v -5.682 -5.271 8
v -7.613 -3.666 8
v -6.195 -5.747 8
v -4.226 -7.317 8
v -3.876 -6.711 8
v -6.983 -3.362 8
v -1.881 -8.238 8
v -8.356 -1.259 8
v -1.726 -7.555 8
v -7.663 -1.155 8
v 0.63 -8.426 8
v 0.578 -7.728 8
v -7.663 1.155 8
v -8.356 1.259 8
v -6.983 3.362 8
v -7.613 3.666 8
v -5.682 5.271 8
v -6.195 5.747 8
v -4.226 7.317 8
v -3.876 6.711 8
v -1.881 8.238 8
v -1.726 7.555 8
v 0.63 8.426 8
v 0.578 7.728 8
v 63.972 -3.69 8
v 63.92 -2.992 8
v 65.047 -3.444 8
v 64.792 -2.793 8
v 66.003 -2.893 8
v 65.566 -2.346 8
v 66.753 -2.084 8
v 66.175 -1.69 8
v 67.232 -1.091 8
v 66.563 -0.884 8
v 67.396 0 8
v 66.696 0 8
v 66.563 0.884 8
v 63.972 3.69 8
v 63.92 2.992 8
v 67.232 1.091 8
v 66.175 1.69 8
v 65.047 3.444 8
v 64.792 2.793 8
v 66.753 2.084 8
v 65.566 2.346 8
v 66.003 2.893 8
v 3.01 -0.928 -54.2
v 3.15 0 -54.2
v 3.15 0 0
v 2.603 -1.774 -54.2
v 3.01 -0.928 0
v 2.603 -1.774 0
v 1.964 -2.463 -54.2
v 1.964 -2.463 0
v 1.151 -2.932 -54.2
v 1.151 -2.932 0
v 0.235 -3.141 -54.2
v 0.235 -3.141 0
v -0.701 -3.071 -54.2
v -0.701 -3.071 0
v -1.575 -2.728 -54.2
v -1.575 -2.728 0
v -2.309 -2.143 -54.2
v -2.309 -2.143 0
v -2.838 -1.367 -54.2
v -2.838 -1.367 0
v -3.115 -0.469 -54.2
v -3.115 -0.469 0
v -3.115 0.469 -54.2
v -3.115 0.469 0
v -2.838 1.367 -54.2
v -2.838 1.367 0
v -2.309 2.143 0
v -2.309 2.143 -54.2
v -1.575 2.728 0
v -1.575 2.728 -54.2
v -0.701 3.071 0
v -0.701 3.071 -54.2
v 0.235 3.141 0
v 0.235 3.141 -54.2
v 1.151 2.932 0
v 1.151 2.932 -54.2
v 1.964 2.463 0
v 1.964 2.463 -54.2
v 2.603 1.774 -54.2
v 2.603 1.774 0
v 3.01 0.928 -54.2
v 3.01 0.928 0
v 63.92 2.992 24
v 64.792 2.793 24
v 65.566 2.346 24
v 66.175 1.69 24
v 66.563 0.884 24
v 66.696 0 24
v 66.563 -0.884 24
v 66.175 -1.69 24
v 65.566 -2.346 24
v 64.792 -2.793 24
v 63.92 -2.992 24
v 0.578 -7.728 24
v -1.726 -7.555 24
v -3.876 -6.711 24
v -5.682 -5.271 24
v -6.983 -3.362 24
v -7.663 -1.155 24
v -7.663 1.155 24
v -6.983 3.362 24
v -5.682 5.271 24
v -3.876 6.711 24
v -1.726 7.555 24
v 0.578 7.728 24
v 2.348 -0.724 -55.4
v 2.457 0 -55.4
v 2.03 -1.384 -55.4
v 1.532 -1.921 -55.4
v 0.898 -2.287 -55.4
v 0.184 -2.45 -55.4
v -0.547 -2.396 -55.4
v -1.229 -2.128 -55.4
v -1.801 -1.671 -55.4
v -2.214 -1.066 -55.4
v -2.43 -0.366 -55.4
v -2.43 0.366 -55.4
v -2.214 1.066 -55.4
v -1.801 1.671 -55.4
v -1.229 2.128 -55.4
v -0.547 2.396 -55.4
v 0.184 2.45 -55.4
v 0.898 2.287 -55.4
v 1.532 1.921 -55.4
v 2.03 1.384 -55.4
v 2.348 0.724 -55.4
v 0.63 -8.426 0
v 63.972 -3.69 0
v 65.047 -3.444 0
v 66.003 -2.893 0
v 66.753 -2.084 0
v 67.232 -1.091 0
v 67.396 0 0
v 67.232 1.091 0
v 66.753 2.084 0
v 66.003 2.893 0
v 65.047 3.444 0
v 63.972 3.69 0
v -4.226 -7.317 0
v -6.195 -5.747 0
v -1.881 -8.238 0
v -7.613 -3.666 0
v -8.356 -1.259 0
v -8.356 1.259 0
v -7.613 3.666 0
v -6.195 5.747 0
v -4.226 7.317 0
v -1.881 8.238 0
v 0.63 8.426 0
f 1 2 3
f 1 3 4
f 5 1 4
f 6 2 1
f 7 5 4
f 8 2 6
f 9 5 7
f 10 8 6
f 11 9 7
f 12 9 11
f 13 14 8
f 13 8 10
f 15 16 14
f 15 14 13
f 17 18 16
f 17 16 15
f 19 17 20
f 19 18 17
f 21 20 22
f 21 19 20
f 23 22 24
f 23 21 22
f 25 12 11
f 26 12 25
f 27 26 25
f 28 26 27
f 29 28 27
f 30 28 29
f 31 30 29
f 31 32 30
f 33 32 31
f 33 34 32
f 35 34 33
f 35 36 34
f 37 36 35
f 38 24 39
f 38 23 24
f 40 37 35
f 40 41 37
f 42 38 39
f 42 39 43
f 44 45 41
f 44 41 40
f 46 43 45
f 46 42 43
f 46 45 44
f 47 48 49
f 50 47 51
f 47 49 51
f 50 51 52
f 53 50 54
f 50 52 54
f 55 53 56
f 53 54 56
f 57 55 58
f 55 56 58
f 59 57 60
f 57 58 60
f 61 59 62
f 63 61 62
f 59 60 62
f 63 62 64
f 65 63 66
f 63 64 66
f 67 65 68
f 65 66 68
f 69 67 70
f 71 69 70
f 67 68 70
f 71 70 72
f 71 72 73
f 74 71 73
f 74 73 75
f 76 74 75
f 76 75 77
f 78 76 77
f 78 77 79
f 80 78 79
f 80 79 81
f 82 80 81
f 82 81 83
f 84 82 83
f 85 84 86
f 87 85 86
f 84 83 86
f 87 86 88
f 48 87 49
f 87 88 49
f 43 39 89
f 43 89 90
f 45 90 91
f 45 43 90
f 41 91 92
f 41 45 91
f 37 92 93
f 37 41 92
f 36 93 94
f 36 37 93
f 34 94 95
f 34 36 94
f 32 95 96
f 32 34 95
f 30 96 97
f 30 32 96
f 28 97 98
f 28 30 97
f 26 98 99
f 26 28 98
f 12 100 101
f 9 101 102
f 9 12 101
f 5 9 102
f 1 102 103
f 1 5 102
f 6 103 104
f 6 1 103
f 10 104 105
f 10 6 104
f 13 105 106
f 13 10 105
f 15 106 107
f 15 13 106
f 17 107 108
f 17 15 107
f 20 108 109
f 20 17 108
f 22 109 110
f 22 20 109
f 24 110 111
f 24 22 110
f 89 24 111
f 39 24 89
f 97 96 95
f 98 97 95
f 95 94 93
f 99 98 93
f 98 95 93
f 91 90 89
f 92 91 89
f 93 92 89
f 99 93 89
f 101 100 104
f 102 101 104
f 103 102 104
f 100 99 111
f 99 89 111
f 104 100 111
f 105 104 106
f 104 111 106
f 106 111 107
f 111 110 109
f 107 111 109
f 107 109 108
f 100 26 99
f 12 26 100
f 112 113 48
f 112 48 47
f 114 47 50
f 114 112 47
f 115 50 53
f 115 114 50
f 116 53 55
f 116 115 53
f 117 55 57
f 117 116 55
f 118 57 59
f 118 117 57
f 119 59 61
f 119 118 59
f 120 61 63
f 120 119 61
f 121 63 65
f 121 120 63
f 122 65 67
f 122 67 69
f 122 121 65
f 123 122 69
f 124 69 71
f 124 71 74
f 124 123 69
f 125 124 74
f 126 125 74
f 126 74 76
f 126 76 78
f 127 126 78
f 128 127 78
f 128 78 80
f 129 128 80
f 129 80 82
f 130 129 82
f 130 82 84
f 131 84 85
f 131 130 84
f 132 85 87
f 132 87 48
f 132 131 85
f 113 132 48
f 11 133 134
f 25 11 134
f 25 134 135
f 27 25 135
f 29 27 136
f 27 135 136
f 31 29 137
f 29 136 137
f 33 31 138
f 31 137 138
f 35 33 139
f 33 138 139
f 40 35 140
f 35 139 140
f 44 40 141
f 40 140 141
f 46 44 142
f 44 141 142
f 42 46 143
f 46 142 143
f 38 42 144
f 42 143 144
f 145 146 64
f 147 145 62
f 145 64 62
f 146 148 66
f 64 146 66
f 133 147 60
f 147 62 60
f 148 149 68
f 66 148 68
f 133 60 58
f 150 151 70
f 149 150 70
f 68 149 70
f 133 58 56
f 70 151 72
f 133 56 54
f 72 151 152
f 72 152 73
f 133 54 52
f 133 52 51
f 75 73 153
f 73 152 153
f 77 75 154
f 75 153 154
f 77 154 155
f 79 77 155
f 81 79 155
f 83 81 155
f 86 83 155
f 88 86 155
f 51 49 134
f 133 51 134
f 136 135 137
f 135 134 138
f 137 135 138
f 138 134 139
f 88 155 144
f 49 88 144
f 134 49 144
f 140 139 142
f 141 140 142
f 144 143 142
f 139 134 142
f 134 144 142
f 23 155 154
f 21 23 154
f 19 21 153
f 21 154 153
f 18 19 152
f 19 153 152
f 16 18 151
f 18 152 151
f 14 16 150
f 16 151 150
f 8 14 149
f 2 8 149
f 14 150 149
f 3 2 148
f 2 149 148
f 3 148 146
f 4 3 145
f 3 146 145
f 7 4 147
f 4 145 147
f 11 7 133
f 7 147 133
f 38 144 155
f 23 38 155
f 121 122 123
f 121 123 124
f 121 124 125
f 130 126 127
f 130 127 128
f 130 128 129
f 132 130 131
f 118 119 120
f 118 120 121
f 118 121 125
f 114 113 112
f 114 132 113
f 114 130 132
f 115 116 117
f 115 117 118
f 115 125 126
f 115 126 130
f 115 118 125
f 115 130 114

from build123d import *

# Parameters (mm, degrees)
SALIENTE_EXTRUIR1_DEPTH = 24
SALIENTE_EXTRUIR2_DEPTH = 8
CROQUIS3_R              = 3.15
SALIENTE_EXTRUIR3_DEPTH = 55.4
CHAFL_N1_SIZE           = 1.2
CHAFL_N1_SIZE2          = 0.692820323


with BuildPart() as part:
    # Croquis1 → Saliente-Extruir1 (new body)
    with BuildSketch(Plane.XY):
        with BuildLine():
            Line((63.919718915, 2.991646678), (0.57794053, 7.728420585))
            ThreePointArc((0.57794053, 7.728420585), (-7.75, 0), (0.57794053, -7.728420585))
            Line((0.57794053, -7.728420585), (63.919718915, -2.991646678))
            ThreePointArc((63.919718915, -2.991646678), (66.696, 0), (63.919718915, 2.991646678))
        make_face()
    extrude(amount=SALIENTE_EXTRUIR1_DEPTH)

    # Croquis2 → Saliente-Extruir2 (add)
    with BuildSketch(Plane.XY):
        with BuildLine():
            Line((0.63014161, -8.426471477), (63.971919995, -3.68969757))
            ThreePointArc((63.971919995, -3.68969757), (67.396, 0), (63.971919995, 3.68969757))
            Line((63.971919995, 3.68969757), (0.63014161, 8.426471477))
            ThreePointArc((0.63014161, 8.426471477), (-8.45, 0), (0.63014161, -8.426471477))
        make_face()
        with BuildLine():
            Line((63.919718915, 2.991646678), (0.57794053, 7.728420585))
            ThreePointArc((0.57794053, 7.728420585), (-7.75, 0), (0.57794053, -7.728420585))
            Line((0.57794053, -7.728420585), (63.919718915, -2.991646678))
            ThreePointArc((63.919718915, -2.991646678), (66.696, 0), (63.919718915, 2.991646678))
        make_face(mode=Mode.SUBTRACT)
    extrude(amount=SALIENTE_EXTRUIR2_DEPTH)

    # Croquis3 → Saliente-Extruir3 (add)
    with BuildSketch(Plane(origin=(0, 0, 0), x_dir=(-1, 0, 0), z_dir=(0, 0, -1))):
        Circle(CROQUIS3_R)
    extrude(amount=SALIENTE_EXTRUIR3_DEPTH)

    # Chaflán1
    chafl_n1_edges = [part.edges().sort_by_distance(p)[0] for p in [
        (3.15, 0, -55.4),
    ]]
    chafl_n1_side = [part.faces().sort_by_distance(p)[0] for p in [
        (3.15, 0, -27.7),
    ]]
    chamfer(chafl_n1_edges, length=CHAFL_N1_SIZE, length2=CHAFL_N1_SIZE2, reference=chafl_n1_side[0])


solid = part.part
